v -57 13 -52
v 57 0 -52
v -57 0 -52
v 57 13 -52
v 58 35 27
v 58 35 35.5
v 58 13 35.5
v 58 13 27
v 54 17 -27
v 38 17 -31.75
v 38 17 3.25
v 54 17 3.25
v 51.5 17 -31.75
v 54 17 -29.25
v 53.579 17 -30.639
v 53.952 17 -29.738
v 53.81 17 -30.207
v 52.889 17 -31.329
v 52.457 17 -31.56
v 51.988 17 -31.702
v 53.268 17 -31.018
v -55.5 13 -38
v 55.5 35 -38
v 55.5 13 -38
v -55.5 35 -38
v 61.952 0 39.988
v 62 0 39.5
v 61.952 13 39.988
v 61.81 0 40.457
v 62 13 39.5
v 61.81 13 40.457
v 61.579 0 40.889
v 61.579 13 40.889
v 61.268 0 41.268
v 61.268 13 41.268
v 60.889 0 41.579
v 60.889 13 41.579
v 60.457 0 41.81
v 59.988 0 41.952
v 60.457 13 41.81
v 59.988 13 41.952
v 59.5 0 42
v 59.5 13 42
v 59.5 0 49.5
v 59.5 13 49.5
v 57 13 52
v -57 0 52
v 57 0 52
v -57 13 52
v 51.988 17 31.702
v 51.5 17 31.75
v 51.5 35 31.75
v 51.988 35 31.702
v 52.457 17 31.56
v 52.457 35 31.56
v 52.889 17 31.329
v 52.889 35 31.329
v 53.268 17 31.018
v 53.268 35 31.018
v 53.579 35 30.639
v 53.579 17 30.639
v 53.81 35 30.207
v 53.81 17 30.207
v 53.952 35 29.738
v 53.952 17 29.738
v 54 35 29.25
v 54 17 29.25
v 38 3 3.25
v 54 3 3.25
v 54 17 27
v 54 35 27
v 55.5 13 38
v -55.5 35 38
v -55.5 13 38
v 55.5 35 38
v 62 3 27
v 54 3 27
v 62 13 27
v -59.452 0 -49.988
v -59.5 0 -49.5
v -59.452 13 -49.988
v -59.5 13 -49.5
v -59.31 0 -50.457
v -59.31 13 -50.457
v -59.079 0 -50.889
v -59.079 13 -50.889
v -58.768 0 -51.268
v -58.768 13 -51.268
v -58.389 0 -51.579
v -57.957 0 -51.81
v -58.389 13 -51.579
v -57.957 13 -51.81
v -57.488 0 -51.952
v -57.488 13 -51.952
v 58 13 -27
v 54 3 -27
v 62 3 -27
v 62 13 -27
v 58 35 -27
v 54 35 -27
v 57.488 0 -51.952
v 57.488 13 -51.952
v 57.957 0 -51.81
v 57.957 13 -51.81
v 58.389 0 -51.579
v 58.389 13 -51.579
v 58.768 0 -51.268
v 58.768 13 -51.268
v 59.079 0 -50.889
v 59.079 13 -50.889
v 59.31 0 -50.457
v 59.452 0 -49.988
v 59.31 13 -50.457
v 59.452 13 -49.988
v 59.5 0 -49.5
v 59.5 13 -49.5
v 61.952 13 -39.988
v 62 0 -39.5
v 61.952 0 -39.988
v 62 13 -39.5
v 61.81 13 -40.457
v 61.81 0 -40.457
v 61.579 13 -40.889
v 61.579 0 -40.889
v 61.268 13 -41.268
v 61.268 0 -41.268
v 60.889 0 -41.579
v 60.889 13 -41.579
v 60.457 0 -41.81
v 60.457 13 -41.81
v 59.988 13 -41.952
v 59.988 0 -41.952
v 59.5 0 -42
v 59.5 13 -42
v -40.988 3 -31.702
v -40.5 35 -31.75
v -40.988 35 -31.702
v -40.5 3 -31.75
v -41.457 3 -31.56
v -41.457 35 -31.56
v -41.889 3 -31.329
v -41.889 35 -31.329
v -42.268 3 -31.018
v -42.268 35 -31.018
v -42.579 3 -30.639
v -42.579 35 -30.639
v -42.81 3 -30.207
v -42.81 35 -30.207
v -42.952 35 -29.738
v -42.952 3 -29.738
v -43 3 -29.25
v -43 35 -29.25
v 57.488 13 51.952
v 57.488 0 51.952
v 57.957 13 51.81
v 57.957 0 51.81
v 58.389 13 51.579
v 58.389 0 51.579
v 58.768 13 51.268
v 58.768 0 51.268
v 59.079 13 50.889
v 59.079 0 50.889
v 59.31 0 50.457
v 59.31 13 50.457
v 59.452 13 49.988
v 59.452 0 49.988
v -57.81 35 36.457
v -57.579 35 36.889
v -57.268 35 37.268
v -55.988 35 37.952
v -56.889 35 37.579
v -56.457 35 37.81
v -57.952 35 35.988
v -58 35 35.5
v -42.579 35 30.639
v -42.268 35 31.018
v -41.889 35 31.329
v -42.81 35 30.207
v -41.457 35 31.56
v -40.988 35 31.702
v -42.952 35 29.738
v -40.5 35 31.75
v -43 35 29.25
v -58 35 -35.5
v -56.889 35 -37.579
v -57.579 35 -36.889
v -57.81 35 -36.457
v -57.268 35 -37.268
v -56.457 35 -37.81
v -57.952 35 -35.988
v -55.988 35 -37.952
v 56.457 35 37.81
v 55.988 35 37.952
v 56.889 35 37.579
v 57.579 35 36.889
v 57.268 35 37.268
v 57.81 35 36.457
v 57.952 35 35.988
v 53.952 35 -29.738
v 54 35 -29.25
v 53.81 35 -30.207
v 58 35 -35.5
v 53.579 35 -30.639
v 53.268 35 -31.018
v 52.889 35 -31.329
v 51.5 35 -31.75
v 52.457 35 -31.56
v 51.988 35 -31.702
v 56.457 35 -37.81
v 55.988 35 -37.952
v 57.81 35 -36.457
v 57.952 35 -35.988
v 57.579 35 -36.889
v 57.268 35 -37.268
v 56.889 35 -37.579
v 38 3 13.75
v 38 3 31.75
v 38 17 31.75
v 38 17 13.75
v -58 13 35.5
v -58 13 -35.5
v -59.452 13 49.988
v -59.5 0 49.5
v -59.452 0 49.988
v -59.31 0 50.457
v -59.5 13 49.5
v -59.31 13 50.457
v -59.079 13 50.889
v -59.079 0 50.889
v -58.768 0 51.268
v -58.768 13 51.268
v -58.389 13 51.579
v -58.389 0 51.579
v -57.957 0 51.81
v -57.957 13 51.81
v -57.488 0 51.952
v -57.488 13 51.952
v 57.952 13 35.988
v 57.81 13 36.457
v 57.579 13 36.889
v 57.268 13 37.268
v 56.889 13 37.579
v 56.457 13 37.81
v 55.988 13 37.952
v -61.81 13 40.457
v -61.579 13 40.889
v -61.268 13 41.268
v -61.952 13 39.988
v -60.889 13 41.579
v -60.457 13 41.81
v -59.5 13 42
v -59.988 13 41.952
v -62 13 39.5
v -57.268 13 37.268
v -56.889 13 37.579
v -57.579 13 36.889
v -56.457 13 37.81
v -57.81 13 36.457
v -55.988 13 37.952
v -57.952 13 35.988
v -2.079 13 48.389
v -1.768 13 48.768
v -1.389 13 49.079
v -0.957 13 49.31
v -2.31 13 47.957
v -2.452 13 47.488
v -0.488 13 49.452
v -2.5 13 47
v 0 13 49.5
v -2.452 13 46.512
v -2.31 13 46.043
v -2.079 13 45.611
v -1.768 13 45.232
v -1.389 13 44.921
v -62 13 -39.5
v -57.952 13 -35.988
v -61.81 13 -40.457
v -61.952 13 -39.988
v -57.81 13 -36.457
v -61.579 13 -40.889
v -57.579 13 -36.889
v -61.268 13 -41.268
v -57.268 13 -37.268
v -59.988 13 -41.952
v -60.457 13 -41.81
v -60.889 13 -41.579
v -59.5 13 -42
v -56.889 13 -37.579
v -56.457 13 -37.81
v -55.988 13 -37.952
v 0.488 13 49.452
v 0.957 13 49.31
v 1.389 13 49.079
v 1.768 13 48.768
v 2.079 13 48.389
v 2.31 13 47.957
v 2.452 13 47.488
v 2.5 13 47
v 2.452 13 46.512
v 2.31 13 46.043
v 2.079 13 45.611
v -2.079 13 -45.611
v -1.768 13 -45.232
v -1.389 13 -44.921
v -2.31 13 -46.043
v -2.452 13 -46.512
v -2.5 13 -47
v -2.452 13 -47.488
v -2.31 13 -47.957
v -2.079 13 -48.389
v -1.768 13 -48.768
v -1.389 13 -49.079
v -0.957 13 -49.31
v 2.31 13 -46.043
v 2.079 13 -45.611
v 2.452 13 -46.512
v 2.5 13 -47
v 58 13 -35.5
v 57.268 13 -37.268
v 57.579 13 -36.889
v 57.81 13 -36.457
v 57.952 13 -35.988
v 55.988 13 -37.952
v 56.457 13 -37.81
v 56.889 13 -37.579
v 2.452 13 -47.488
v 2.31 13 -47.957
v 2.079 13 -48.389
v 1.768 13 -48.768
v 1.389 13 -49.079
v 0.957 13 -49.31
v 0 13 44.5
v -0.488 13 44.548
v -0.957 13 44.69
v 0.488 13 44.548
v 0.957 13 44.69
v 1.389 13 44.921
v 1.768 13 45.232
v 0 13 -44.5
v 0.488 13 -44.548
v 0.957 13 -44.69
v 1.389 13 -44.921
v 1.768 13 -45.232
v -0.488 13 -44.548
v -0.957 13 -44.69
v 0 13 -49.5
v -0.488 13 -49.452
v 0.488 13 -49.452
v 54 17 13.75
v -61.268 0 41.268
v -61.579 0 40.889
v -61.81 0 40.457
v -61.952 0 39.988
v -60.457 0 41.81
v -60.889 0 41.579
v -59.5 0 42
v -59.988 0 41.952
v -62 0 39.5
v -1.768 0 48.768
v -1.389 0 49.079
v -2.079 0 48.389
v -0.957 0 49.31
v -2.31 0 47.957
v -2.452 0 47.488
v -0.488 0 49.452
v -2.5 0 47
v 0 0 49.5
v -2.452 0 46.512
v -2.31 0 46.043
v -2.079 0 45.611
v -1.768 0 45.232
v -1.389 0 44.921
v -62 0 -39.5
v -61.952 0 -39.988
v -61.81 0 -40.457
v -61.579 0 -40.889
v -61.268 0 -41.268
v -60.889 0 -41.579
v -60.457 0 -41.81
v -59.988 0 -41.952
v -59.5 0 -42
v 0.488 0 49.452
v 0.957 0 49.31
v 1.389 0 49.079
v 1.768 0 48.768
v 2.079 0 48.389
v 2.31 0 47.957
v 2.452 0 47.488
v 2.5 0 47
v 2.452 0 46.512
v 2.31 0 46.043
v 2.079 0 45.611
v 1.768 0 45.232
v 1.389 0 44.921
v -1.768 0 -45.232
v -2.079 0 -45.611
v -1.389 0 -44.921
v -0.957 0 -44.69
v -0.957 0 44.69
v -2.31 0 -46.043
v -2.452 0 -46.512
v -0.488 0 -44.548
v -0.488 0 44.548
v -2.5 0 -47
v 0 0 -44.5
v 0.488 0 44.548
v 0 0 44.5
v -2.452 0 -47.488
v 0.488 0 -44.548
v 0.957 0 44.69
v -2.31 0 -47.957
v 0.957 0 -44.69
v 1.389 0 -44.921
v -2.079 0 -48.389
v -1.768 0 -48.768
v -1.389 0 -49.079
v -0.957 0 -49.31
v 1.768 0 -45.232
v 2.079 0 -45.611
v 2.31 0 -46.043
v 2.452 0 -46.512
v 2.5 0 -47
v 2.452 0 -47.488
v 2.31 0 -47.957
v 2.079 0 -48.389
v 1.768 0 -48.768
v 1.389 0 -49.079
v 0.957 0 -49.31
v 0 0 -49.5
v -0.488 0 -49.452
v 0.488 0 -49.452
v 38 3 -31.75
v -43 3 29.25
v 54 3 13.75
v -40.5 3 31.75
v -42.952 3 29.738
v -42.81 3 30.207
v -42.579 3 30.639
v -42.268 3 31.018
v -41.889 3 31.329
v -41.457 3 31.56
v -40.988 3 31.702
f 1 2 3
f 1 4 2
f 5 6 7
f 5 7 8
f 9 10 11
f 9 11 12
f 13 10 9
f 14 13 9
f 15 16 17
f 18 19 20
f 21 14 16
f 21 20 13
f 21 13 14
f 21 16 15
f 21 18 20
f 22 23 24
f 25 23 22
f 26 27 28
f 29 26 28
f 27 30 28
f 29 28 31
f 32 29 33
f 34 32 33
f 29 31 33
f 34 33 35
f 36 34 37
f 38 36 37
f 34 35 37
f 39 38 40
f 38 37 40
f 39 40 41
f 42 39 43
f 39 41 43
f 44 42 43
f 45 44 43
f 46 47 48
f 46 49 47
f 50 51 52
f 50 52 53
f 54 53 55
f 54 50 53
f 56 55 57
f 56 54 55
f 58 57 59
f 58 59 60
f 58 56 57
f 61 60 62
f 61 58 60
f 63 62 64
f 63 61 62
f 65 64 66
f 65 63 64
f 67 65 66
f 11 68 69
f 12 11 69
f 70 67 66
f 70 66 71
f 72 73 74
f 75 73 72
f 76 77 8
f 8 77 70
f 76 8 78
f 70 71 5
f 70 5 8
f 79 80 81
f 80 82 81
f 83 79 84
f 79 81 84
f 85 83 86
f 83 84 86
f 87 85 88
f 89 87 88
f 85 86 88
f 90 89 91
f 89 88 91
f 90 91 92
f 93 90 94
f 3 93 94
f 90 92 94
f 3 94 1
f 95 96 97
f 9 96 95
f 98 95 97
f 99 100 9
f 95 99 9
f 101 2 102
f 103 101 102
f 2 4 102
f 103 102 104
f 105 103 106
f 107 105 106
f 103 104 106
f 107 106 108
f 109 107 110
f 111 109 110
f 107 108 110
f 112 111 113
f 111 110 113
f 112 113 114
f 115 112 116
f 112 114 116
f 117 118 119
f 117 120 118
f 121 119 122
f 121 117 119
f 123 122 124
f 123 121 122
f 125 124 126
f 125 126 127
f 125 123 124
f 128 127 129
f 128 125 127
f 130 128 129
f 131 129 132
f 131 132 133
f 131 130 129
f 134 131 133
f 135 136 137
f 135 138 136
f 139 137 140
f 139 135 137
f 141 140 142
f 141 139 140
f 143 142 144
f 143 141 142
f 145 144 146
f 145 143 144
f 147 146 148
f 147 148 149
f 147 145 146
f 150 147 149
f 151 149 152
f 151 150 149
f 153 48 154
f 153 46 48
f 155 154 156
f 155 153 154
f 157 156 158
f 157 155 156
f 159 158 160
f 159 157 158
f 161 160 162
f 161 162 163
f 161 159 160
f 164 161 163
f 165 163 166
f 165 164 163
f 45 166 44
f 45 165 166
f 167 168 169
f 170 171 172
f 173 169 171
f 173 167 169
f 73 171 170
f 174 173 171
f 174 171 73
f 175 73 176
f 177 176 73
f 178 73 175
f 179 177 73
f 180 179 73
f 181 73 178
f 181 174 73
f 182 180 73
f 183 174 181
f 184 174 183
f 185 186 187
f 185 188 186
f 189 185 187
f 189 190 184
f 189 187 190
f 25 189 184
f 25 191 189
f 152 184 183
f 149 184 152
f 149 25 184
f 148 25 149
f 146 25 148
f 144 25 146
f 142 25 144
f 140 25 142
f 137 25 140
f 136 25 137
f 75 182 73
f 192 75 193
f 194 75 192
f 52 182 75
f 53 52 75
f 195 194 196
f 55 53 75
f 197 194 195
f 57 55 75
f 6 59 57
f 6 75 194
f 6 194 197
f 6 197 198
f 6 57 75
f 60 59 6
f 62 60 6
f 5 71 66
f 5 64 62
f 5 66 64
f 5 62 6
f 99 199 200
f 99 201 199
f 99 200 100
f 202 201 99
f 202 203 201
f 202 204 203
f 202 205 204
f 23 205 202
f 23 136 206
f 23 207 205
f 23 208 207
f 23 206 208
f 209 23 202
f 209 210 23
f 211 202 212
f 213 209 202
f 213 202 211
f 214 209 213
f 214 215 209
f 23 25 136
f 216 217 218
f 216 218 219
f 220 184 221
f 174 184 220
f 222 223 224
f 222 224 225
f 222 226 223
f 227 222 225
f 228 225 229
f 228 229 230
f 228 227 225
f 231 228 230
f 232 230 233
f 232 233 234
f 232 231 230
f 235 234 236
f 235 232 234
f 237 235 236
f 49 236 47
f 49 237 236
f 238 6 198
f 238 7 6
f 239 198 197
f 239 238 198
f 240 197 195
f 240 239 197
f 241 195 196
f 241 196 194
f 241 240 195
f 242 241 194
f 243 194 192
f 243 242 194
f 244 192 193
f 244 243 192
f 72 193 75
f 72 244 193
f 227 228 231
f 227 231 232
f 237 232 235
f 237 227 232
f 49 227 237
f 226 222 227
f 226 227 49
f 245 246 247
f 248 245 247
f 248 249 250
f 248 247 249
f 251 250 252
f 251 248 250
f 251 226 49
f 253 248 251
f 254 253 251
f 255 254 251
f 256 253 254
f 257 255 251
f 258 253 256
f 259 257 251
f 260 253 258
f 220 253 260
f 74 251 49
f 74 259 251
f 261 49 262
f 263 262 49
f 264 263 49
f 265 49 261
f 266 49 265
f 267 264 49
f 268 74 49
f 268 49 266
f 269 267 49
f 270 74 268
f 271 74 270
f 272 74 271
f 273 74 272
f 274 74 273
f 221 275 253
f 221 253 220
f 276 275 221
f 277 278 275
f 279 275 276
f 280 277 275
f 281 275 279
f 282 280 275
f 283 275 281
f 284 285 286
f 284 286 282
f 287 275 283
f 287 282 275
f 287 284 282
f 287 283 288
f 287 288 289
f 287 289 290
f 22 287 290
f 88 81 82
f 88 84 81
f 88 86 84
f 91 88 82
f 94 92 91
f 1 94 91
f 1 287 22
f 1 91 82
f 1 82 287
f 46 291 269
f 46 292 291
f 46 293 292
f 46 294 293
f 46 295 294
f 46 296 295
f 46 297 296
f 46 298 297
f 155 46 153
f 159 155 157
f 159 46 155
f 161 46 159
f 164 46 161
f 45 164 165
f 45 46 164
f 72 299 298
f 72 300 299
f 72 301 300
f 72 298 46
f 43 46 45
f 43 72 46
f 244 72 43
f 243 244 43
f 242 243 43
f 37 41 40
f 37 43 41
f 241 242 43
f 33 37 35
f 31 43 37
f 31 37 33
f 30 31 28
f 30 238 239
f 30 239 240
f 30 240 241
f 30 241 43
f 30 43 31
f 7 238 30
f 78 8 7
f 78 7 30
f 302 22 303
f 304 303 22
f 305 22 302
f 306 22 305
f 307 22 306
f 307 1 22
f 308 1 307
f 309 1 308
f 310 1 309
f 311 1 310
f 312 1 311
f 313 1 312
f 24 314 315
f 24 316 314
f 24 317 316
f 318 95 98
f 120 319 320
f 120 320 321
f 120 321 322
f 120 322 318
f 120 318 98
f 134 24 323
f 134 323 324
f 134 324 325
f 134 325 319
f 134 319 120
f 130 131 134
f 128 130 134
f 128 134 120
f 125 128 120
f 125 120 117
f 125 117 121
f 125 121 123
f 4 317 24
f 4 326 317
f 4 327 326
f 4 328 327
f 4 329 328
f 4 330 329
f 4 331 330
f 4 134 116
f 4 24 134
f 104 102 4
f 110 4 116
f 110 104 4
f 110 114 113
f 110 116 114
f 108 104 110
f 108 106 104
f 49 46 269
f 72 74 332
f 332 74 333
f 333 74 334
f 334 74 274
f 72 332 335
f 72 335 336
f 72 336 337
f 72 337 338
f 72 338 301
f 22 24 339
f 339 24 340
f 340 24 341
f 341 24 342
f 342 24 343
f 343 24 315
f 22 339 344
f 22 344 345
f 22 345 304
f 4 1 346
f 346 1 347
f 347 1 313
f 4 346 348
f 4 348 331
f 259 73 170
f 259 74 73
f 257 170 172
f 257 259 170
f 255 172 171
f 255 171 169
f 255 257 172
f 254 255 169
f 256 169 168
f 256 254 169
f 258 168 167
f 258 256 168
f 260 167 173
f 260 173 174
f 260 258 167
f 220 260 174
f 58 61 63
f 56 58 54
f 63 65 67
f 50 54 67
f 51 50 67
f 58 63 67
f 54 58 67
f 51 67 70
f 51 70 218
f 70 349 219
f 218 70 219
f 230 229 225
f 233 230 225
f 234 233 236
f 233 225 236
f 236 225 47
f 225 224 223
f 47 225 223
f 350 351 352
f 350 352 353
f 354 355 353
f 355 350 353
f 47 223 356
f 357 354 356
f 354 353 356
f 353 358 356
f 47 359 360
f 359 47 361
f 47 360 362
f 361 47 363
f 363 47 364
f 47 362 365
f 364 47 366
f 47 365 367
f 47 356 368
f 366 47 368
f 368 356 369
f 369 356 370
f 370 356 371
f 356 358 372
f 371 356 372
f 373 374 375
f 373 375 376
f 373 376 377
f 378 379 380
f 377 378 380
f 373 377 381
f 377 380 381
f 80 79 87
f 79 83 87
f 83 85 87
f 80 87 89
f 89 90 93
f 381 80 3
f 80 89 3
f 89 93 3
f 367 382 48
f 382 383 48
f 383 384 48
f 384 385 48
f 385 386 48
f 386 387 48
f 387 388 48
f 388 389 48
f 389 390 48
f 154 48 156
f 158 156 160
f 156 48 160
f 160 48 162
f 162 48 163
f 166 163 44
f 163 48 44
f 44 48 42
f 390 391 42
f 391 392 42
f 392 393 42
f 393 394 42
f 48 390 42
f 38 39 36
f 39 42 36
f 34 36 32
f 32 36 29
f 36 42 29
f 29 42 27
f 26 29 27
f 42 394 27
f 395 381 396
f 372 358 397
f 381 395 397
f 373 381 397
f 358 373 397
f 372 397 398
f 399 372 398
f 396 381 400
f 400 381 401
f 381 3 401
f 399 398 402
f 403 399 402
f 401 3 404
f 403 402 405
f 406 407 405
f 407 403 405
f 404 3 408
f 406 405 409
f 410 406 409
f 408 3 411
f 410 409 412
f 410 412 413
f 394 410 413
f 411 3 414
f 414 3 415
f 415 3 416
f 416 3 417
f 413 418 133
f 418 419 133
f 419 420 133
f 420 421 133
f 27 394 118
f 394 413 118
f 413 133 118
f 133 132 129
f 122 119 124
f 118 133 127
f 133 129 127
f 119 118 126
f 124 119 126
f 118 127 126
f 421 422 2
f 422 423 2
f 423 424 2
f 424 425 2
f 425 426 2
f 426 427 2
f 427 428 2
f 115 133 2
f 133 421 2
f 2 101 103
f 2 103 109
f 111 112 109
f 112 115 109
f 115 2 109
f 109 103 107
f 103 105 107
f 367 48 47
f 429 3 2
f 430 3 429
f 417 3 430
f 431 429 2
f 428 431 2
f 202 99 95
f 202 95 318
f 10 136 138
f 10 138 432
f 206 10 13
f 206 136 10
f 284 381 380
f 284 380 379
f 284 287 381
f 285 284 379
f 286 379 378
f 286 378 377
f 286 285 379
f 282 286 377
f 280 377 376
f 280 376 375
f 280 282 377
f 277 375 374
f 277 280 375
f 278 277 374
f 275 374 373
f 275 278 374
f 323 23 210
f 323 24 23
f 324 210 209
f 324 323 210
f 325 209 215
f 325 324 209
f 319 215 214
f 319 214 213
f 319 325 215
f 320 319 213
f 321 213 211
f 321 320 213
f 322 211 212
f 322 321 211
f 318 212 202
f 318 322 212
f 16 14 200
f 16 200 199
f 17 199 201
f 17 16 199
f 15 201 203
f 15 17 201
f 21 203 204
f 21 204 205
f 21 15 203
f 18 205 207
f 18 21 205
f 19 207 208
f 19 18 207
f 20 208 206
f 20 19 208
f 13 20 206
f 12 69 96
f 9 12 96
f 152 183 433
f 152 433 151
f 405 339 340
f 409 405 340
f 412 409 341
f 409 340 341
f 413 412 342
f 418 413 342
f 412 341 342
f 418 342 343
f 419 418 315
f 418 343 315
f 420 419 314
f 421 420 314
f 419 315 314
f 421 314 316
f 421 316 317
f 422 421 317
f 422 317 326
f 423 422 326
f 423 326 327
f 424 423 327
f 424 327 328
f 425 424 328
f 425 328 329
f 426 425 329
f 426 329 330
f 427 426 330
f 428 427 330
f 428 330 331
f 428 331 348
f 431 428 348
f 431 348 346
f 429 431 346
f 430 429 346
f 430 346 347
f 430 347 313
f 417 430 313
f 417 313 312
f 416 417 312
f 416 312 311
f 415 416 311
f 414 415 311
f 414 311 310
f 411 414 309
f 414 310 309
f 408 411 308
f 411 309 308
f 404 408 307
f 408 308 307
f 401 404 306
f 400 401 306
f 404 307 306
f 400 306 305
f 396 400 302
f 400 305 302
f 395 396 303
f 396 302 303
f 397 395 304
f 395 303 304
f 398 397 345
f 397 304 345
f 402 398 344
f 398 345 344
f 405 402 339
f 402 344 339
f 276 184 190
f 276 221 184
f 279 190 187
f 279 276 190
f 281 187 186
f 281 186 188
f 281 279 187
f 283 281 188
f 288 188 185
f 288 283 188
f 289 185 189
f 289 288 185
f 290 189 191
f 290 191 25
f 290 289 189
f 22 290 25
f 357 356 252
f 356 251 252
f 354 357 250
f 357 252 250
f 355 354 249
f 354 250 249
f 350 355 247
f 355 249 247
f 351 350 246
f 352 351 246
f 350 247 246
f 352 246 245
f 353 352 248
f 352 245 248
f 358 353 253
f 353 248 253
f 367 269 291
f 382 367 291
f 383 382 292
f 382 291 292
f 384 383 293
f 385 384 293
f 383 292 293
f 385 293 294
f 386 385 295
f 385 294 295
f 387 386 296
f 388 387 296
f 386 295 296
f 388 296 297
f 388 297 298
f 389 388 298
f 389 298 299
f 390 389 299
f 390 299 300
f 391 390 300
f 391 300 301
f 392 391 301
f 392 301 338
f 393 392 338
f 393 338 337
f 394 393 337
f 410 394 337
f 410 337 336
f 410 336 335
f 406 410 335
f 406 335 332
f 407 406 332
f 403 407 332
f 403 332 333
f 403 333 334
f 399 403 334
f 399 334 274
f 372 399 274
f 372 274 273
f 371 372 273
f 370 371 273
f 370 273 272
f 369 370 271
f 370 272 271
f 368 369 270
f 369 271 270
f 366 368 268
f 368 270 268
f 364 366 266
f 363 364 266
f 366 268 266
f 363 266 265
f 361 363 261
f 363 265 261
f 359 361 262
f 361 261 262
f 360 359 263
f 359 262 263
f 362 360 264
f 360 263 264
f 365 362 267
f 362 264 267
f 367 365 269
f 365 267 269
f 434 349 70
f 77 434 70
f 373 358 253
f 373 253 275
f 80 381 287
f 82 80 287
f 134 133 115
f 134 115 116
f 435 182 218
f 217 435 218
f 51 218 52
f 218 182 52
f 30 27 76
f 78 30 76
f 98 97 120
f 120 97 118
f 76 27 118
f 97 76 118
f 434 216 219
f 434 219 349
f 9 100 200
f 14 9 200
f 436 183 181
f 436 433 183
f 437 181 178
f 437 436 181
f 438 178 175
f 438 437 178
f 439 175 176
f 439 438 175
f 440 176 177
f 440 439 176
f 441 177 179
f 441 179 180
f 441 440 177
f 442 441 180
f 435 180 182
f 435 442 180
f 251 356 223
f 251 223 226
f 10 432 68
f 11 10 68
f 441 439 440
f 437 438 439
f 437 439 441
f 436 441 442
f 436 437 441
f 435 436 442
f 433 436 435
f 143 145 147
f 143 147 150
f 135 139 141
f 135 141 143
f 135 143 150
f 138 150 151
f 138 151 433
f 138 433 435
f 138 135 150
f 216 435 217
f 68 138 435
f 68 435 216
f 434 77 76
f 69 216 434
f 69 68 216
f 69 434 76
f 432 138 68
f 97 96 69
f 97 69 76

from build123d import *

# Parameters (mm, degrees)
SKETCH1_W           = 124
SKETCH1_H           = 84
BOSS_EXTRUDE1_DEPTH = 35
SKETCH2_W           = 97
SKETCH2_H           = 63.5
CUT_EXTRUDE1_DEPTH  = 32
SKETCH4_W           = 8
SKETCH4_H           = 54
CUT_EXTRUDE2_DEPTH  = 32
FILLET2_R           = 2.5
CUT_EXTRUDE3_DEPTH  = 22
FILLET4_R           = 2.5
SKETCH9_W           = 119
SKETCH9_H           = 13
BOSS_EXTRUDE3_DEPTH = 10
SKETCH11_W          = 119
SKETCH11_H          = 13
BOSS_EXTRUDE4_DEPTH = 10
SKETCH12_R          = 2.5
CUT_EXTRUDE6_DEPTH  = 84.857021173
FILLET5_R           = 2.5
BOSS_EXTRUDE5_DEPTH = 14


with BuildPart() as part:
    # Sketch1 → Boss-Extrude1 (new body)
    with BuildSketch(Plane(origin=(0, 0, 0), x_dir=(1, 0, 0), z_dir=(0, 1, 0))):
        Rectangle(SKETCH1_W, SKETCH1_H)
    extrude(amount=BOSS_EXTRUDE1_DEPTH)

    # Sketch2 → Cut-Extrude1 (cut)
    with BuildSketch(Plane(origin=(0, 35, 0), x_dir=(1, 0, 0), z_dir=(0, 1, 0))):
        with Locations((5.5, 0)):
            Rectangle(SKETCH2_W, SKETCH2_H)
    extrude(amount=-CUT_EXTRUDE1_DEPTH, mode=Mode.SUBTRACT)

    # Sketch4 → Cut-Extrude2 (cut)
    with BuildSketch(Plane(origin=(0, 35, 0), x_dir=(1, 0, 0), z_dir=(0, 1, 0))):
        with Locations((58, 0)):
            Rectangle(SKETCH4_W, SKETCH4_H)
    extrude(amount=-CUT_EXTRUDE2_DEPTH, mode=Mode.SUBTRACT)

    # Fillet2
    fillet2_edges = [part.edges().sort_by_distance(p)[0] for p in [
        (-43, 19, 31.75),
        (-43, 19, -31.75),
        (54, 19, -31.75),
        (54, 19, 31.75),
    ]]
    fillet(fillet2_edges, radius=FILLET2_R)

    # Sketch6 → Cut-Extrude3 (cut)
    with BuildSketch(Plane(origin=(0, 35, 0), x_dir=(1, 0, 0), z_dir=(0, 1, 0))):
        Polygon((-62, 42), (62, 42), (62, 27), (58, 27), (58, 38), (-58, 38), (-58, -38), (58, -38), (58, -27), (62, -27), (62, -42), (-62, -42), align=None)
    extrude(amount=-CUT_EXTRUDE3_DEPTH, mode=Mode.SUBTRACT)

    # Fillet4
    fillet4_edges = [part.edges().sort_by_distance(p)[0] for p in [
        (62, 6.5, 42),
        (-62, 6.5, 42),
        (-62, 6.5, -42),
        (62, 6.5, -42),
        (58, 24, -38),
        (-58, 24, -38),
        (-58, 24, 38),
        (58, 24, 38),
    ]]
    fillet(fillet4_edges, radius=FILLET4_R)

    # Sketch9 → Boss-Extrude3 (add)
    with BuildSketch(Plane(origin=(0, 0, -42), x_dir=(-1, 0, 0), z_dir=(0, 0, -1))):
        with Locations((0, 6.5)):
            Rectangle(SKETCH9_W, SKETCH9_H)
    extrude(amount=BOSS_EXTRUDE3_DEPTH)

    # Sketch11 → Boss-Extrude4 (add)
    with BuildSketch(Plane.XY.offset(42)):
        with Locations((0, 6.5)):
            Rectangle(SKETCH11_W, SKETCH11_H)
    extrude(amount=BOSS_EXTRUDE4_DEPTH)

    # Sketch12 → Cut-Extrude6 (cut, through all)
    with BuildSketch(Plane(origin=(0, 13, 0), x_dir=(1, 0, 0), z_dir=(0, 1, 0))):
        with Locations(Location((0, 47, 0), (0, 0, 270))):
            Circle(SKETCH12_R)
        with Locations(Location((0, -47, 0), (0, 0, 270))):
            Circle(SKETCH12_R)
    extrude(amount=-CUT_EXTRUDE6_DEPTH, mode=Mode.SUBTRACT)

    # Fillet5
    fillet5_edges = [part.edges().sort_by_distance(p)[0] for p in [
        (59.5, 6.5, -52),
        (-59.5, 6.5, -52),
        (-59.5, 6.5, 52),
        (59.5, 6.5, 52),
    ]]
    fillet(fillet5_edges, radius=FILLET5_R)

    # Sketch13 → Boss-Extrude5 (add)
    with BuildSketch(Plane(origin=(0, 3, 0), x_dir=(1, 0, 0), z_dir=(0, 1, 0))):
        with BuildLine():
            Line((38, 31.75), (38, -3.25))
            Line((38, -3.25), (54, -3.25))
            Line((54, -3.25), (54, 27))
            Line((54, 27), (54, 29.25))
            ThreePointArc((54, 29.25), (53.267766953, 31.017766953), (51.5, 31.75))
            Line((51.5, 31.75), (38, 31.75))
        make_face()
        with BuildLine():
            Line((38, -31.75), (38, -13.75))
            Line((38, -13.75), (54, -13.75))
            Line((54, -13.75), (54, -27))
            Line((54, -27), (54, -29.25))
            ThreePointArc((54, -29.25), (53.267766953, -31.017766953), (51.5, -31.75))
            Line((51.5, -31.75), (38, -31.75))
        make_face()
    extrude(amount=BOSS_EXTRUDE5_DEPTH)


solid = part.part
